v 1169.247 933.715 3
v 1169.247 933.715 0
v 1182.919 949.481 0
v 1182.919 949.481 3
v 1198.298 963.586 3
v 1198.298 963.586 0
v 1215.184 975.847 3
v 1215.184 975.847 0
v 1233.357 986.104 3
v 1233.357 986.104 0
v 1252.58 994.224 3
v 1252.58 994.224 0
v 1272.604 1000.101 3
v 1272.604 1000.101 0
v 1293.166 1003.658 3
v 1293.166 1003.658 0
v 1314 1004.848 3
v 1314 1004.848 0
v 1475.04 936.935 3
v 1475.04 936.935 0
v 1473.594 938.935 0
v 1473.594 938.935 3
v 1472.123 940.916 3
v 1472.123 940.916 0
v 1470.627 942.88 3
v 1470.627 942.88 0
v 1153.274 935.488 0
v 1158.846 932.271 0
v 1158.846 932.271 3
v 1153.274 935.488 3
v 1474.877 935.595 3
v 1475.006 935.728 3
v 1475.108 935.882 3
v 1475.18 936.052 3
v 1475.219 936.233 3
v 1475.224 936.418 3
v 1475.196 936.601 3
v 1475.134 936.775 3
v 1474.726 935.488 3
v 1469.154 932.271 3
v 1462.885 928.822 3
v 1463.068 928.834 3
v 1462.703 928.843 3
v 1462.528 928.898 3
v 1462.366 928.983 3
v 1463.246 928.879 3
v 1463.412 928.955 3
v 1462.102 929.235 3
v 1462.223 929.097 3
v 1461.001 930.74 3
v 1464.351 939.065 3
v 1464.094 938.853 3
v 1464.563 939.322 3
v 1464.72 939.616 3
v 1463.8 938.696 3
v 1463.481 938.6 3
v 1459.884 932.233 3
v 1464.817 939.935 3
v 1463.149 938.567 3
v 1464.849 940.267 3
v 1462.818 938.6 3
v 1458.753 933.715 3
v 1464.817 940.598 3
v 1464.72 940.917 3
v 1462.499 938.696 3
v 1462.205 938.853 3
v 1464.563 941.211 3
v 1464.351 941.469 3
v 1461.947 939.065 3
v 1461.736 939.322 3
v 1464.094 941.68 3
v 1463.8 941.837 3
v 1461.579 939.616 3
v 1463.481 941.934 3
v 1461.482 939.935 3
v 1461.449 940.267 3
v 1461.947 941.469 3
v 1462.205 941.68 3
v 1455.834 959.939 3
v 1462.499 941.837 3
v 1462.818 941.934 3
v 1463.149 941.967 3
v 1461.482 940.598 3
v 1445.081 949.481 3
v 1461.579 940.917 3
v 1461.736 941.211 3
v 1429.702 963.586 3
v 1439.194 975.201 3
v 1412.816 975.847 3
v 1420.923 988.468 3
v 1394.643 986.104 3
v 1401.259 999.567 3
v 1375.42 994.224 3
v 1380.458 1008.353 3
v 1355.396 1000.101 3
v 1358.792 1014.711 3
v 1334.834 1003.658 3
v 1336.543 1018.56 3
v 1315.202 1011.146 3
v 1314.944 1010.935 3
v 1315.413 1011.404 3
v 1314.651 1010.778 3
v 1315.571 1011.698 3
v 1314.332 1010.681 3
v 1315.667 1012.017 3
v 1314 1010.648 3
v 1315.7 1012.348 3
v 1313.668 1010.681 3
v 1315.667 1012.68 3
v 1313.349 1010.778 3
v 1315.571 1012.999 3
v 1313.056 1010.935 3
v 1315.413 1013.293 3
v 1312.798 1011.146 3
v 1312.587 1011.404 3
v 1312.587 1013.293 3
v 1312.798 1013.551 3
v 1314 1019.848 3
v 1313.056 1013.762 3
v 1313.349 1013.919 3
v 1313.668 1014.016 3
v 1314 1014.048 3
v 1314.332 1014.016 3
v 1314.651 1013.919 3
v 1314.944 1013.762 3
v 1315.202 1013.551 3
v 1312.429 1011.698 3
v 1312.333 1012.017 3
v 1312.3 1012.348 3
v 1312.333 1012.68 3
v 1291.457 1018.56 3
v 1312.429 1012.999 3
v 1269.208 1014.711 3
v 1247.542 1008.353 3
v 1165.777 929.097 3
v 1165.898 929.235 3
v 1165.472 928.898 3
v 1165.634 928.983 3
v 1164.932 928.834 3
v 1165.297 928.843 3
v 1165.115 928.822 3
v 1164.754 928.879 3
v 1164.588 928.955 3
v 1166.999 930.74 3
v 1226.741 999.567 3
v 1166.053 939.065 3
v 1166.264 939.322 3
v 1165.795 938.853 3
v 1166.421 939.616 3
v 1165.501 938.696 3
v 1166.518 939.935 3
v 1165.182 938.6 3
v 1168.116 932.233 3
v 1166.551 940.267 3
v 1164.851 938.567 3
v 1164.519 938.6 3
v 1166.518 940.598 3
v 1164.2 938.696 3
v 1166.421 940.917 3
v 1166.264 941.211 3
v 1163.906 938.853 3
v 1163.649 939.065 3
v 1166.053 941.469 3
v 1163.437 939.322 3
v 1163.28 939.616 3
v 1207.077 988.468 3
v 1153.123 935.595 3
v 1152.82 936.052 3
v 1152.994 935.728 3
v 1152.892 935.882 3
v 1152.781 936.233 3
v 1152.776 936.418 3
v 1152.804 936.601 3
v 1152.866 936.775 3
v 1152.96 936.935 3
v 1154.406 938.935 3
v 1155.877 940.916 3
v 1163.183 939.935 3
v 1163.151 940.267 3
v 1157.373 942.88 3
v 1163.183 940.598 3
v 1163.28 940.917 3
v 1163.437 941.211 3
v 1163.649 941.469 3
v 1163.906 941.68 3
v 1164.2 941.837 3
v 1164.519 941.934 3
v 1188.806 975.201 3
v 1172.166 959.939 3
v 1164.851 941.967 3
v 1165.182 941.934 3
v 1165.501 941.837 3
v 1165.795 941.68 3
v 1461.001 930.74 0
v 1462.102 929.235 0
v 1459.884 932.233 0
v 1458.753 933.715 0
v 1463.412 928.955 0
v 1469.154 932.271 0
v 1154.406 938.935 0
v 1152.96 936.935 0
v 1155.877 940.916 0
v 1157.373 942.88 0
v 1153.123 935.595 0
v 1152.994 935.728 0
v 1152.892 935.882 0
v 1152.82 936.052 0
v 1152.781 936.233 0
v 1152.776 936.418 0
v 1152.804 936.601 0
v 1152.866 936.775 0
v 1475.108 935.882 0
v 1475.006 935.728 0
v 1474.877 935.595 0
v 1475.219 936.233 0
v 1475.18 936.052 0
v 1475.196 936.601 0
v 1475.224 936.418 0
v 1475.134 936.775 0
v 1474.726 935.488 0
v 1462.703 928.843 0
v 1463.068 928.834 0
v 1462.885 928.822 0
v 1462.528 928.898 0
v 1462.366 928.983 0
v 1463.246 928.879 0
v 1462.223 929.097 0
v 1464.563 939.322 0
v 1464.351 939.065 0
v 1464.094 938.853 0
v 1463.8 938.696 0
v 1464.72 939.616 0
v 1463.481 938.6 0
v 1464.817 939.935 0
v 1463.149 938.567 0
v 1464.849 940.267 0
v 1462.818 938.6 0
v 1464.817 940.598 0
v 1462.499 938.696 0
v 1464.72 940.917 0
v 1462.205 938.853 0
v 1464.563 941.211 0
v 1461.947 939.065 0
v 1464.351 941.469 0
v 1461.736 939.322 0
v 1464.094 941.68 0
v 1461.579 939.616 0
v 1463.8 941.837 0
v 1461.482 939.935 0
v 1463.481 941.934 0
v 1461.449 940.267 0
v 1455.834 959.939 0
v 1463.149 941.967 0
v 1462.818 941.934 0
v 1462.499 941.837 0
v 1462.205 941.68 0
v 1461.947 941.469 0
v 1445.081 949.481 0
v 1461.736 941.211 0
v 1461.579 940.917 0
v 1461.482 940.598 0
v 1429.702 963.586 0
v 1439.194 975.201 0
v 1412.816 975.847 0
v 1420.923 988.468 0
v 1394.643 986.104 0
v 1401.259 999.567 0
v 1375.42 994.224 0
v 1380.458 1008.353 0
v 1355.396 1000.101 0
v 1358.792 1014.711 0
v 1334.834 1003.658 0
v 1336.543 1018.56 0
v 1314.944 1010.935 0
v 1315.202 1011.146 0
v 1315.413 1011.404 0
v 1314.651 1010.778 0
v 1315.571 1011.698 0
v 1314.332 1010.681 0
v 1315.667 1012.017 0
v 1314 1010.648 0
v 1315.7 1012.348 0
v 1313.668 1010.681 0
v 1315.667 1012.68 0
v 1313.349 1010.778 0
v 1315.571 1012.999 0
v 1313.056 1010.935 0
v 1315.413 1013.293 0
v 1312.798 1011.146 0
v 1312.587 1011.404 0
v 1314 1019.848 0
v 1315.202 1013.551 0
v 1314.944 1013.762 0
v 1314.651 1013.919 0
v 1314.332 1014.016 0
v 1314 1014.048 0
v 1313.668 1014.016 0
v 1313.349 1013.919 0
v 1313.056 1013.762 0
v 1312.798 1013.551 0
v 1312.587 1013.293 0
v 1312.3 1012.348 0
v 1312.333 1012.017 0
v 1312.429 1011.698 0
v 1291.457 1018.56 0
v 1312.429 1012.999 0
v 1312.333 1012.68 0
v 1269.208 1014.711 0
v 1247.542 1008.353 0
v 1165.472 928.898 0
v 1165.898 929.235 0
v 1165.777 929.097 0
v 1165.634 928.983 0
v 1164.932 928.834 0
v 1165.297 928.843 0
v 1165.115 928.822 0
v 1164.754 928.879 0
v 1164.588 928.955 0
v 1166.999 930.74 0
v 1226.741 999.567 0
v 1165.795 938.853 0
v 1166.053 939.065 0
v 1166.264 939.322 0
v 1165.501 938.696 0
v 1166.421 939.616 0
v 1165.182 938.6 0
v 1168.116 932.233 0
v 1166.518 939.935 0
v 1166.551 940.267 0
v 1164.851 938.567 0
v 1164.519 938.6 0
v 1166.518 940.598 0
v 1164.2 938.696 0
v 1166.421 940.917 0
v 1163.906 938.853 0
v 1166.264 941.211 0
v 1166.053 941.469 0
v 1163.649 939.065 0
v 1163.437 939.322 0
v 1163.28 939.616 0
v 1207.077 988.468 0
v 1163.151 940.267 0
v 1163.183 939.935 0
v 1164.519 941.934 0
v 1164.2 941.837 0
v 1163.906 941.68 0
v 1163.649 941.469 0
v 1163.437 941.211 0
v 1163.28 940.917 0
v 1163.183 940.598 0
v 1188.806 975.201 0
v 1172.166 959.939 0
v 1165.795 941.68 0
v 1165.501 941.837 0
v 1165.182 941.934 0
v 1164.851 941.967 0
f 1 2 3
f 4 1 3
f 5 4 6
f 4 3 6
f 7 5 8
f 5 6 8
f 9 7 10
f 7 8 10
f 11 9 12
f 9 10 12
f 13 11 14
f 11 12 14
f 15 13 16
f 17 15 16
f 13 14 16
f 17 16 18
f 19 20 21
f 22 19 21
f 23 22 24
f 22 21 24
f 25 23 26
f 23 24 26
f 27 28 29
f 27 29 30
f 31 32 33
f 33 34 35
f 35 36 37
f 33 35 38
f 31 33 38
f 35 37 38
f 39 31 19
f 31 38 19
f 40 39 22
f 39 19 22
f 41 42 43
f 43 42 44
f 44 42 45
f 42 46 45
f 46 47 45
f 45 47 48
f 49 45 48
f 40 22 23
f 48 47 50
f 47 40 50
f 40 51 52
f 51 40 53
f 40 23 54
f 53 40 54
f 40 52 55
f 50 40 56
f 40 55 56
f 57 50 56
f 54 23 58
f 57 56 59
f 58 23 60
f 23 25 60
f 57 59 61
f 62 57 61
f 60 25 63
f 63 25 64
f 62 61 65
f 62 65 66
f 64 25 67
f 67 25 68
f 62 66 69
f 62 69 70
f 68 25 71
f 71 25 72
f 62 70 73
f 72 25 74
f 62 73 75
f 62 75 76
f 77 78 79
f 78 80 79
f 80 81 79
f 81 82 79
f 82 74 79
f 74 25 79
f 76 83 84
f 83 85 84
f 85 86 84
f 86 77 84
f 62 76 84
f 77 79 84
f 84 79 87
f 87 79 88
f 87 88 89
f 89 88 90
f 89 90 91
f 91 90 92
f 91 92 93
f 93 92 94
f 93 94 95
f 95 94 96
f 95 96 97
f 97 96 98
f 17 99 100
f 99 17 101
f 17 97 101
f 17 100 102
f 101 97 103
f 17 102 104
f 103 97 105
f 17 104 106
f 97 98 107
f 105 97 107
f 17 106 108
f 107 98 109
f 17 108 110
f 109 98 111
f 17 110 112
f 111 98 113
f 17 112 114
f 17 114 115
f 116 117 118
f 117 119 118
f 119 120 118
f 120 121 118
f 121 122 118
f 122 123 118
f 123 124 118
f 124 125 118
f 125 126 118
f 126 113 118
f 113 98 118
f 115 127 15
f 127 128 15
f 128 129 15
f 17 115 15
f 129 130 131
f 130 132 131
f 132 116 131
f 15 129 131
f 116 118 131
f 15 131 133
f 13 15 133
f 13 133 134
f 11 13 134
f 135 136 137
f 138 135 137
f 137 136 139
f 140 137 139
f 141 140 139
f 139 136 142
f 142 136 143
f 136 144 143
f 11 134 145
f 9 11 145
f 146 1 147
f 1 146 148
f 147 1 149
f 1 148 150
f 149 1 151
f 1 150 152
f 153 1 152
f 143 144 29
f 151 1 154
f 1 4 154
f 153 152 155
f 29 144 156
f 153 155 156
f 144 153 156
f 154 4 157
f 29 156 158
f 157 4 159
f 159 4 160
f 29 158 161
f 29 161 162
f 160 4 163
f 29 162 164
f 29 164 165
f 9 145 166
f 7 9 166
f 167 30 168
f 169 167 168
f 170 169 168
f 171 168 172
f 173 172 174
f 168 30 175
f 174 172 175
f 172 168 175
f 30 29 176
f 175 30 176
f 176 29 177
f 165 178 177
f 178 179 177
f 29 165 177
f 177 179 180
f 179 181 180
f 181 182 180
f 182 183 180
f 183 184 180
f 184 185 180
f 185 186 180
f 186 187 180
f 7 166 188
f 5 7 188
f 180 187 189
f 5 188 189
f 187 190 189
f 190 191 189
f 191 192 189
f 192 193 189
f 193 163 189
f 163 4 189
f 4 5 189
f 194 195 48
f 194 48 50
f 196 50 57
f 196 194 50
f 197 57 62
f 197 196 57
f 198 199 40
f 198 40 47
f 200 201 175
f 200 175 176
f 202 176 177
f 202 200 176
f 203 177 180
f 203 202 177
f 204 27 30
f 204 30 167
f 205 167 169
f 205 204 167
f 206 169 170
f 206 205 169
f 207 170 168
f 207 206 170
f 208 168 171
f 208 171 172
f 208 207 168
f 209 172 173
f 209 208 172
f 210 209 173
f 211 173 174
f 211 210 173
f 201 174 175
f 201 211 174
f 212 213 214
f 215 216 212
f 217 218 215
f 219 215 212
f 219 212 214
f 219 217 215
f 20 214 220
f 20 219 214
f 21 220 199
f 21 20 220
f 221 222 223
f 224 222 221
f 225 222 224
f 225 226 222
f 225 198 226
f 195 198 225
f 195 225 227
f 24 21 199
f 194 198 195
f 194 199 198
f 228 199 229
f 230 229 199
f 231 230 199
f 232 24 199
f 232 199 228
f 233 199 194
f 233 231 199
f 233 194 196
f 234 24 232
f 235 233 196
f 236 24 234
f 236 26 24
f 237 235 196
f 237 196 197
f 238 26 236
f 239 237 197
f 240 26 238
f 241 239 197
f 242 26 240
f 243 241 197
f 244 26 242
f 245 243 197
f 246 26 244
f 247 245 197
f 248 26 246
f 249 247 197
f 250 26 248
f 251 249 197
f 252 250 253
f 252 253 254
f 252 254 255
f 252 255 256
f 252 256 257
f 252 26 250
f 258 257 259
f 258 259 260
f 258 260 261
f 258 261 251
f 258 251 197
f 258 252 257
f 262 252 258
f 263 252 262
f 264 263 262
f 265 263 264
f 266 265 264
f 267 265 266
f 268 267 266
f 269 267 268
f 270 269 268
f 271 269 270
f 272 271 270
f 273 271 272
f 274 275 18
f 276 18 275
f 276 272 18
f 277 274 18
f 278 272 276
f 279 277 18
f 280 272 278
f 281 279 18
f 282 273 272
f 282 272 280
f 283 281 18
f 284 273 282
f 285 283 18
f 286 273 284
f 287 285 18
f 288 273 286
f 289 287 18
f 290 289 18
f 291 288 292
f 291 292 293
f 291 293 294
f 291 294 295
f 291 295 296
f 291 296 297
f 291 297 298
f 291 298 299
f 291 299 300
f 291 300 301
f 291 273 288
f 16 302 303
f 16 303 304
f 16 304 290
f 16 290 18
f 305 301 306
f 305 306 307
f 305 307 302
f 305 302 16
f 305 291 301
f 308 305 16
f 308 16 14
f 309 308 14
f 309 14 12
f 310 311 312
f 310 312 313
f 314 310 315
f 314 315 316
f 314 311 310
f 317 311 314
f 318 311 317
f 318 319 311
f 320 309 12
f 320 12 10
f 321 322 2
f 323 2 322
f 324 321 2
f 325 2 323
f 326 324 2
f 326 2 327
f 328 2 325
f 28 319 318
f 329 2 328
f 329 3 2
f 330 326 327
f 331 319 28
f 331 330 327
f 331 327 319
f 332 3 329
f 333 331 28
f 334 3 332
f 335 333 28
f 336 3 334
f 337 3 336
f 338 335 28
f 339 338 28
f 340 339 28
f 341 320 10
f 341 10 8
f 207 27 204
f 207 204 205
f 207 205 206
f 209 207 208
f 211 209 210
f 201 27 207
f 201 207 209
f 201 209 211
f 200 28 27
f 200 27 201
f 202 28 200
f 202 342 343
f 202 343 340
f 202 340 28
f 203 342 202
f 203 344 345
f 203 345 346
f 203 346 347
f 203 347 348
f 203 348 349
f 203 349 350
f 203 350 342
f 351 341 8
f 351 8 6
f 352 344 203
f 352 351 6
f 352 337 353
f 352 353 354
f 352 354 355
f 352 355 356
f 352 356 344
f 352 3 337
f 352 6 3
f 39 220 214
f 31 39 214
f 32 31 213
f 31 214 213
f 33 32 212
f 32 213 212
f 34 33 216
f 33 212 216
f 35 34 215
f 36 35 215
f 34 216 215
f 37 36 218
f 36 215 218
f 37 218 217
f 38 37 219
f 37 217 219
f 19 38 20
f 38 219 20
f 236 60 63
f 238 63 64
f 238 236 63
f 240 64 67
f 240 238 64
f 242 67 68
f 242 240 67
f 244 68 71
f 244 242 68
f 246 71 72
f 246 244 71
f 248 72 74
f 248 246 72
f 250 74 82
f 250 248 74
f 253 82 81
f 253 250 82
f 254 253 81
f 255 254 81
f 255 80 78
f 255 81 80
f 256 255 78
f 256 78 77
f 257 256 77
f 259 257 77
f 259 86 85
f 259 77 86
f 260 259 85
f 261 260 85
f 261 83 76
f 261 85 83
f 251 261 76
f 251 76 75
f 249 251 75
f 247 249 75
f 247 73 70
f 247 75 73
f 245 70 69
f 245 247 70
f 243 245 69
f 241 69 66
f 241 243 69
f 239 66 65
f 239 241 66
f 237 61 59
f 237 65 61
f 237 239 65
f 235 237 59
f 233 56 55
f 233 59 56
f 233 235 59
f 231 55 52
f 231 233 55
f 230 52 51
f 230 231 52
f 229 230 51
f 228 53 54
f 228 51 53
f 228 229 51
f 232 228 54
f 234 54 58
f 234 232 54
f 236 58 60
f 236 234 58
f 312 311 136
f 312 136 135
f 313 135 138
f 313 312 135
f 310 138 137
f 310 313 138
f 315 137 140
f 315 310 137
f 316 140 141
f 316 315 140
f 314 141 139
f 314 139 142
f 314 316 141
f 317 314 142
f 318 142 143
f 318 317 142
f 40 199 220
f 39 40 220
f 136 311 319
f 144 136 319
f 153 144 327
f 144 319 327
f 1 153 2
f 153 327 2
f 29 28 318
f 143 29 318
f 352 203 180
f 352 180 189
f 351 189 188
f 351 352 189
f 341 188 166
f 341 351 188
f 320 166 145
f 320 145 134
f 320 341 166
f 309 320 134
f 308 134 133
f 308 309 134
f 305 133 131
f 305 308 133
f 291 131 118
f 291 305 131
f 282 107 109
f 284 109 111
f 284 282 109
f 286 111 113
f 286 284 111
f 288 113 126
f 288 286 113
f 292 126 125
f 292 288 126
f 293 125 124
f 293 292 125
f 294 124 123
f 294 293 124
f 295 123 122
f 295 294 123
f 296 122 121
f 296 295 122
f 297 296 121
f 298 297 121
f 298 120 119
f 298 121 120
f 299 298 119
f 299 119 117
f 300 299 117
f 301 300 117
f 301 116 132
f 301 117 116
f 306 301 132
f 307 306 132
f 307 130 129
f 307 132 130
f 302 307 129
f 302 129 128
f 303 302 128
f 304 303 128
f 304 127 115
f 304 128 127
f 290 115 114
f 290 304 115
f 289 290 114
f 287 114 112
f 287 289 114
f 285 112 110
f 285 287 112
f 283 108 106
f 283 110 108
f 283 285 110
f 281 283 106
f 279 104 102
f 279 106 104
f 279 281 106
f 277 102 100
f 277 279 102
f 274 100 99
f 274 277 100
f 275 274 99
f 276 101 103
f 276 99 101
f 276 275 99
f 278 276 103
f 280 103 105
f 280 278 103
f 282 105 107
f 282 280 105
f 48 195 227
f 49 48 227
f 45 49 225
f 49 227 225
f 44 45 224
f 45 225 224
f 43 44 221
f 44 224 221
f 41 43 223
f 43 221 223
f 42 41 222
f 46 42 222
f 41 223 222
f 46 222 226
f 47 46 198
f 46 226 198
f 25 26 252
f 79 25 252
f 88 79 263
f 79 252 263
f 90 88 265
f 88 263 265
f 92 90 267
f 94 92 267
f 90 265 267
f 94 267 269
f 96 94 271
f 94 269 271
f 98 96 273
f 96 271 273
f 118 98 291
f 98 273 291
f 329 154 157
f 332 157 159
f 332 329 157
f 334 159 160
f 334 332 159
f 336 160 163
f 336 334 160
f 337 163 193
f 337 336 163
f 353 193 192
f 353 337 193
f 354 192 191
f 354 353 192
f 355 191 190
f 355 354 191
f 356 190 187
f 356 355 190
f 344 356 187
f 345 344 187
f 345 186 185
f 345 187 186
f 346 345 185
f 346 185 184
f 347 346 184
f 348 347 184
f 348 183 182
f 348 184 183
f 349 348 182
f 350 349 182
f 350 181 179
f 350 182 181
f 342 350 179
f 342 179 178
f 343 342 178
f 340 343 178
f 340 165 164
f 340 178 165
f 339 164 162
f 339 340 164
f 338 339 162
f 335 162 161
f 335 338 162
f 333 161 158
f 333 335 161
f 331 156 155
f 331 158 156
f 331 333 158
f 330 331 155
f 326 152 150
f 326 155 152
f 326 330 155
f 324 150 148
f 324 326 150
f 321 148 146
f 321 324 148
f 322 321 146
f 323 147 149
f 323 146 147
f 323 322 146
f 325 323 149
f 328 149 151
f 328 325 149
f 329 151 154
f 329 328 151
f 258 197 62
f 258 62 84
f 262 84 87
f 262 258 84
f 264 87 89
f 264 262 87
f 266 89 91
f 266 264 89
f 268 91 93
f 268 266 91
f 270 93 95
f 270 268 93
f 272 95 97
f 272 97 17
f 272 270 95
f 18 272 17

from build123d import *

# Parameters (mm, degrees)
PAD021_DEPTH                        = 3
SKETCH083_R                         = 1.7
POCKET041_DEPTH                     = 0.001
POCKET041_DEPTH_BACK                = 3.001
SKETCH084_R                         = 1.7
POCKET042_DEPTH                     = 0.001
POCKET042_DEPTH_BACK                = 3.001
BODY001003005003013_PLACEMENT_ANGLE = 60
CLONE020_PLACEMENT_ANGLE            = 60


with BuildPart() as part:
    # Sketch082 → Pad021 (new body)
    with BuildSketch(Plane.XY):
        with BuildLine():
            ThreePointArc((156.627412, 120.879551), (87.258751, 177.56667), (0, 197.848457))
            Line((0, 197.848457), (0, 182.848457))
            ThreePointArc((144.752611, 111.714995), (80.643177, 164.104346), (0, 182.848457))
            ThreePointArc((148.102078, 107.234942), (146.444477, 109.487778), (144.752611, 111.714995))
            ThreePointArc((148.102078, 107.234942), (148.703343, 106.843433), (149.41205, 106.955386))
            Line((155.154429, 110.27075), (149.41205, 106.955386))
            Line((155.154429, 110.27075), (160.726477, 113.487773))
            ThreePointArc((160.726477, 113.487773), (161.203737, 114.141753), (161.040435, 114.934722))
            ThreePointArc((161.040435, 114.934722), (158.861734, 117.927781), (156.627412, 120.879551))
        make_face()
    pad021 = extrude(amount=PAD021_DEPTH)

    # Mirrored029: Pad021 across Sketch082 V_Axis
    add(pad021.mirror(Plane(origin=(0, 0, 0), x_dir=(0, 0, 1), z_dir=(1, 0, 0))))

    # Sketch083 → Pocket041 (cut, two sides)
    with BuildSketch(Plane.XY) as pocket041_sk:
        with Locations((149.149219, 118.266841)):
            Circle(SKETCH083_R)
        with Locations((-149.149219, 118.266841)):
            Circle(SKETCH083_R)
    extrude(amount=-POCKET041_DEPTH, mode=Mode.SUBTRACT)
    extrude(pocket041_sk.sketch, amount=POCKET041_DEPTH_BACK, mode=Mode.SUBTRACT)

    # Sketch084 → Pocket042 (cut, two sides)
    with BuildSketch(Plane.XY) as pocket042_sk:
        with Locations((0, 190.348457)):
            Circle(SKETCH084_R)
    extrude(amount=-POCKET042_DEPTH, mode=Mode.SUBTRACT)
    extrude(pocket042_sk.sketch, amount=POCKET042_DEPTH_BACK, mode=Mode.SUBTRACT)


with BuildPart() as part_1:
    # Body001003005003013 placement: moved
    add(part.part.rotate(Axis((0, 0, 0), (0, 0, 1)), BODY001003005003013_PLACEMENT_ANGLE))


with BuildPart() as part_2:
    # Clone020 placement: moved
    add(part_1.part.moved(Location((1314, 822, 0))).rotate(Axis((1314, 822, 0), (0, 0, -1)), CLONE020_PLACEMENT_ANGLE))


solid = part_2.part
